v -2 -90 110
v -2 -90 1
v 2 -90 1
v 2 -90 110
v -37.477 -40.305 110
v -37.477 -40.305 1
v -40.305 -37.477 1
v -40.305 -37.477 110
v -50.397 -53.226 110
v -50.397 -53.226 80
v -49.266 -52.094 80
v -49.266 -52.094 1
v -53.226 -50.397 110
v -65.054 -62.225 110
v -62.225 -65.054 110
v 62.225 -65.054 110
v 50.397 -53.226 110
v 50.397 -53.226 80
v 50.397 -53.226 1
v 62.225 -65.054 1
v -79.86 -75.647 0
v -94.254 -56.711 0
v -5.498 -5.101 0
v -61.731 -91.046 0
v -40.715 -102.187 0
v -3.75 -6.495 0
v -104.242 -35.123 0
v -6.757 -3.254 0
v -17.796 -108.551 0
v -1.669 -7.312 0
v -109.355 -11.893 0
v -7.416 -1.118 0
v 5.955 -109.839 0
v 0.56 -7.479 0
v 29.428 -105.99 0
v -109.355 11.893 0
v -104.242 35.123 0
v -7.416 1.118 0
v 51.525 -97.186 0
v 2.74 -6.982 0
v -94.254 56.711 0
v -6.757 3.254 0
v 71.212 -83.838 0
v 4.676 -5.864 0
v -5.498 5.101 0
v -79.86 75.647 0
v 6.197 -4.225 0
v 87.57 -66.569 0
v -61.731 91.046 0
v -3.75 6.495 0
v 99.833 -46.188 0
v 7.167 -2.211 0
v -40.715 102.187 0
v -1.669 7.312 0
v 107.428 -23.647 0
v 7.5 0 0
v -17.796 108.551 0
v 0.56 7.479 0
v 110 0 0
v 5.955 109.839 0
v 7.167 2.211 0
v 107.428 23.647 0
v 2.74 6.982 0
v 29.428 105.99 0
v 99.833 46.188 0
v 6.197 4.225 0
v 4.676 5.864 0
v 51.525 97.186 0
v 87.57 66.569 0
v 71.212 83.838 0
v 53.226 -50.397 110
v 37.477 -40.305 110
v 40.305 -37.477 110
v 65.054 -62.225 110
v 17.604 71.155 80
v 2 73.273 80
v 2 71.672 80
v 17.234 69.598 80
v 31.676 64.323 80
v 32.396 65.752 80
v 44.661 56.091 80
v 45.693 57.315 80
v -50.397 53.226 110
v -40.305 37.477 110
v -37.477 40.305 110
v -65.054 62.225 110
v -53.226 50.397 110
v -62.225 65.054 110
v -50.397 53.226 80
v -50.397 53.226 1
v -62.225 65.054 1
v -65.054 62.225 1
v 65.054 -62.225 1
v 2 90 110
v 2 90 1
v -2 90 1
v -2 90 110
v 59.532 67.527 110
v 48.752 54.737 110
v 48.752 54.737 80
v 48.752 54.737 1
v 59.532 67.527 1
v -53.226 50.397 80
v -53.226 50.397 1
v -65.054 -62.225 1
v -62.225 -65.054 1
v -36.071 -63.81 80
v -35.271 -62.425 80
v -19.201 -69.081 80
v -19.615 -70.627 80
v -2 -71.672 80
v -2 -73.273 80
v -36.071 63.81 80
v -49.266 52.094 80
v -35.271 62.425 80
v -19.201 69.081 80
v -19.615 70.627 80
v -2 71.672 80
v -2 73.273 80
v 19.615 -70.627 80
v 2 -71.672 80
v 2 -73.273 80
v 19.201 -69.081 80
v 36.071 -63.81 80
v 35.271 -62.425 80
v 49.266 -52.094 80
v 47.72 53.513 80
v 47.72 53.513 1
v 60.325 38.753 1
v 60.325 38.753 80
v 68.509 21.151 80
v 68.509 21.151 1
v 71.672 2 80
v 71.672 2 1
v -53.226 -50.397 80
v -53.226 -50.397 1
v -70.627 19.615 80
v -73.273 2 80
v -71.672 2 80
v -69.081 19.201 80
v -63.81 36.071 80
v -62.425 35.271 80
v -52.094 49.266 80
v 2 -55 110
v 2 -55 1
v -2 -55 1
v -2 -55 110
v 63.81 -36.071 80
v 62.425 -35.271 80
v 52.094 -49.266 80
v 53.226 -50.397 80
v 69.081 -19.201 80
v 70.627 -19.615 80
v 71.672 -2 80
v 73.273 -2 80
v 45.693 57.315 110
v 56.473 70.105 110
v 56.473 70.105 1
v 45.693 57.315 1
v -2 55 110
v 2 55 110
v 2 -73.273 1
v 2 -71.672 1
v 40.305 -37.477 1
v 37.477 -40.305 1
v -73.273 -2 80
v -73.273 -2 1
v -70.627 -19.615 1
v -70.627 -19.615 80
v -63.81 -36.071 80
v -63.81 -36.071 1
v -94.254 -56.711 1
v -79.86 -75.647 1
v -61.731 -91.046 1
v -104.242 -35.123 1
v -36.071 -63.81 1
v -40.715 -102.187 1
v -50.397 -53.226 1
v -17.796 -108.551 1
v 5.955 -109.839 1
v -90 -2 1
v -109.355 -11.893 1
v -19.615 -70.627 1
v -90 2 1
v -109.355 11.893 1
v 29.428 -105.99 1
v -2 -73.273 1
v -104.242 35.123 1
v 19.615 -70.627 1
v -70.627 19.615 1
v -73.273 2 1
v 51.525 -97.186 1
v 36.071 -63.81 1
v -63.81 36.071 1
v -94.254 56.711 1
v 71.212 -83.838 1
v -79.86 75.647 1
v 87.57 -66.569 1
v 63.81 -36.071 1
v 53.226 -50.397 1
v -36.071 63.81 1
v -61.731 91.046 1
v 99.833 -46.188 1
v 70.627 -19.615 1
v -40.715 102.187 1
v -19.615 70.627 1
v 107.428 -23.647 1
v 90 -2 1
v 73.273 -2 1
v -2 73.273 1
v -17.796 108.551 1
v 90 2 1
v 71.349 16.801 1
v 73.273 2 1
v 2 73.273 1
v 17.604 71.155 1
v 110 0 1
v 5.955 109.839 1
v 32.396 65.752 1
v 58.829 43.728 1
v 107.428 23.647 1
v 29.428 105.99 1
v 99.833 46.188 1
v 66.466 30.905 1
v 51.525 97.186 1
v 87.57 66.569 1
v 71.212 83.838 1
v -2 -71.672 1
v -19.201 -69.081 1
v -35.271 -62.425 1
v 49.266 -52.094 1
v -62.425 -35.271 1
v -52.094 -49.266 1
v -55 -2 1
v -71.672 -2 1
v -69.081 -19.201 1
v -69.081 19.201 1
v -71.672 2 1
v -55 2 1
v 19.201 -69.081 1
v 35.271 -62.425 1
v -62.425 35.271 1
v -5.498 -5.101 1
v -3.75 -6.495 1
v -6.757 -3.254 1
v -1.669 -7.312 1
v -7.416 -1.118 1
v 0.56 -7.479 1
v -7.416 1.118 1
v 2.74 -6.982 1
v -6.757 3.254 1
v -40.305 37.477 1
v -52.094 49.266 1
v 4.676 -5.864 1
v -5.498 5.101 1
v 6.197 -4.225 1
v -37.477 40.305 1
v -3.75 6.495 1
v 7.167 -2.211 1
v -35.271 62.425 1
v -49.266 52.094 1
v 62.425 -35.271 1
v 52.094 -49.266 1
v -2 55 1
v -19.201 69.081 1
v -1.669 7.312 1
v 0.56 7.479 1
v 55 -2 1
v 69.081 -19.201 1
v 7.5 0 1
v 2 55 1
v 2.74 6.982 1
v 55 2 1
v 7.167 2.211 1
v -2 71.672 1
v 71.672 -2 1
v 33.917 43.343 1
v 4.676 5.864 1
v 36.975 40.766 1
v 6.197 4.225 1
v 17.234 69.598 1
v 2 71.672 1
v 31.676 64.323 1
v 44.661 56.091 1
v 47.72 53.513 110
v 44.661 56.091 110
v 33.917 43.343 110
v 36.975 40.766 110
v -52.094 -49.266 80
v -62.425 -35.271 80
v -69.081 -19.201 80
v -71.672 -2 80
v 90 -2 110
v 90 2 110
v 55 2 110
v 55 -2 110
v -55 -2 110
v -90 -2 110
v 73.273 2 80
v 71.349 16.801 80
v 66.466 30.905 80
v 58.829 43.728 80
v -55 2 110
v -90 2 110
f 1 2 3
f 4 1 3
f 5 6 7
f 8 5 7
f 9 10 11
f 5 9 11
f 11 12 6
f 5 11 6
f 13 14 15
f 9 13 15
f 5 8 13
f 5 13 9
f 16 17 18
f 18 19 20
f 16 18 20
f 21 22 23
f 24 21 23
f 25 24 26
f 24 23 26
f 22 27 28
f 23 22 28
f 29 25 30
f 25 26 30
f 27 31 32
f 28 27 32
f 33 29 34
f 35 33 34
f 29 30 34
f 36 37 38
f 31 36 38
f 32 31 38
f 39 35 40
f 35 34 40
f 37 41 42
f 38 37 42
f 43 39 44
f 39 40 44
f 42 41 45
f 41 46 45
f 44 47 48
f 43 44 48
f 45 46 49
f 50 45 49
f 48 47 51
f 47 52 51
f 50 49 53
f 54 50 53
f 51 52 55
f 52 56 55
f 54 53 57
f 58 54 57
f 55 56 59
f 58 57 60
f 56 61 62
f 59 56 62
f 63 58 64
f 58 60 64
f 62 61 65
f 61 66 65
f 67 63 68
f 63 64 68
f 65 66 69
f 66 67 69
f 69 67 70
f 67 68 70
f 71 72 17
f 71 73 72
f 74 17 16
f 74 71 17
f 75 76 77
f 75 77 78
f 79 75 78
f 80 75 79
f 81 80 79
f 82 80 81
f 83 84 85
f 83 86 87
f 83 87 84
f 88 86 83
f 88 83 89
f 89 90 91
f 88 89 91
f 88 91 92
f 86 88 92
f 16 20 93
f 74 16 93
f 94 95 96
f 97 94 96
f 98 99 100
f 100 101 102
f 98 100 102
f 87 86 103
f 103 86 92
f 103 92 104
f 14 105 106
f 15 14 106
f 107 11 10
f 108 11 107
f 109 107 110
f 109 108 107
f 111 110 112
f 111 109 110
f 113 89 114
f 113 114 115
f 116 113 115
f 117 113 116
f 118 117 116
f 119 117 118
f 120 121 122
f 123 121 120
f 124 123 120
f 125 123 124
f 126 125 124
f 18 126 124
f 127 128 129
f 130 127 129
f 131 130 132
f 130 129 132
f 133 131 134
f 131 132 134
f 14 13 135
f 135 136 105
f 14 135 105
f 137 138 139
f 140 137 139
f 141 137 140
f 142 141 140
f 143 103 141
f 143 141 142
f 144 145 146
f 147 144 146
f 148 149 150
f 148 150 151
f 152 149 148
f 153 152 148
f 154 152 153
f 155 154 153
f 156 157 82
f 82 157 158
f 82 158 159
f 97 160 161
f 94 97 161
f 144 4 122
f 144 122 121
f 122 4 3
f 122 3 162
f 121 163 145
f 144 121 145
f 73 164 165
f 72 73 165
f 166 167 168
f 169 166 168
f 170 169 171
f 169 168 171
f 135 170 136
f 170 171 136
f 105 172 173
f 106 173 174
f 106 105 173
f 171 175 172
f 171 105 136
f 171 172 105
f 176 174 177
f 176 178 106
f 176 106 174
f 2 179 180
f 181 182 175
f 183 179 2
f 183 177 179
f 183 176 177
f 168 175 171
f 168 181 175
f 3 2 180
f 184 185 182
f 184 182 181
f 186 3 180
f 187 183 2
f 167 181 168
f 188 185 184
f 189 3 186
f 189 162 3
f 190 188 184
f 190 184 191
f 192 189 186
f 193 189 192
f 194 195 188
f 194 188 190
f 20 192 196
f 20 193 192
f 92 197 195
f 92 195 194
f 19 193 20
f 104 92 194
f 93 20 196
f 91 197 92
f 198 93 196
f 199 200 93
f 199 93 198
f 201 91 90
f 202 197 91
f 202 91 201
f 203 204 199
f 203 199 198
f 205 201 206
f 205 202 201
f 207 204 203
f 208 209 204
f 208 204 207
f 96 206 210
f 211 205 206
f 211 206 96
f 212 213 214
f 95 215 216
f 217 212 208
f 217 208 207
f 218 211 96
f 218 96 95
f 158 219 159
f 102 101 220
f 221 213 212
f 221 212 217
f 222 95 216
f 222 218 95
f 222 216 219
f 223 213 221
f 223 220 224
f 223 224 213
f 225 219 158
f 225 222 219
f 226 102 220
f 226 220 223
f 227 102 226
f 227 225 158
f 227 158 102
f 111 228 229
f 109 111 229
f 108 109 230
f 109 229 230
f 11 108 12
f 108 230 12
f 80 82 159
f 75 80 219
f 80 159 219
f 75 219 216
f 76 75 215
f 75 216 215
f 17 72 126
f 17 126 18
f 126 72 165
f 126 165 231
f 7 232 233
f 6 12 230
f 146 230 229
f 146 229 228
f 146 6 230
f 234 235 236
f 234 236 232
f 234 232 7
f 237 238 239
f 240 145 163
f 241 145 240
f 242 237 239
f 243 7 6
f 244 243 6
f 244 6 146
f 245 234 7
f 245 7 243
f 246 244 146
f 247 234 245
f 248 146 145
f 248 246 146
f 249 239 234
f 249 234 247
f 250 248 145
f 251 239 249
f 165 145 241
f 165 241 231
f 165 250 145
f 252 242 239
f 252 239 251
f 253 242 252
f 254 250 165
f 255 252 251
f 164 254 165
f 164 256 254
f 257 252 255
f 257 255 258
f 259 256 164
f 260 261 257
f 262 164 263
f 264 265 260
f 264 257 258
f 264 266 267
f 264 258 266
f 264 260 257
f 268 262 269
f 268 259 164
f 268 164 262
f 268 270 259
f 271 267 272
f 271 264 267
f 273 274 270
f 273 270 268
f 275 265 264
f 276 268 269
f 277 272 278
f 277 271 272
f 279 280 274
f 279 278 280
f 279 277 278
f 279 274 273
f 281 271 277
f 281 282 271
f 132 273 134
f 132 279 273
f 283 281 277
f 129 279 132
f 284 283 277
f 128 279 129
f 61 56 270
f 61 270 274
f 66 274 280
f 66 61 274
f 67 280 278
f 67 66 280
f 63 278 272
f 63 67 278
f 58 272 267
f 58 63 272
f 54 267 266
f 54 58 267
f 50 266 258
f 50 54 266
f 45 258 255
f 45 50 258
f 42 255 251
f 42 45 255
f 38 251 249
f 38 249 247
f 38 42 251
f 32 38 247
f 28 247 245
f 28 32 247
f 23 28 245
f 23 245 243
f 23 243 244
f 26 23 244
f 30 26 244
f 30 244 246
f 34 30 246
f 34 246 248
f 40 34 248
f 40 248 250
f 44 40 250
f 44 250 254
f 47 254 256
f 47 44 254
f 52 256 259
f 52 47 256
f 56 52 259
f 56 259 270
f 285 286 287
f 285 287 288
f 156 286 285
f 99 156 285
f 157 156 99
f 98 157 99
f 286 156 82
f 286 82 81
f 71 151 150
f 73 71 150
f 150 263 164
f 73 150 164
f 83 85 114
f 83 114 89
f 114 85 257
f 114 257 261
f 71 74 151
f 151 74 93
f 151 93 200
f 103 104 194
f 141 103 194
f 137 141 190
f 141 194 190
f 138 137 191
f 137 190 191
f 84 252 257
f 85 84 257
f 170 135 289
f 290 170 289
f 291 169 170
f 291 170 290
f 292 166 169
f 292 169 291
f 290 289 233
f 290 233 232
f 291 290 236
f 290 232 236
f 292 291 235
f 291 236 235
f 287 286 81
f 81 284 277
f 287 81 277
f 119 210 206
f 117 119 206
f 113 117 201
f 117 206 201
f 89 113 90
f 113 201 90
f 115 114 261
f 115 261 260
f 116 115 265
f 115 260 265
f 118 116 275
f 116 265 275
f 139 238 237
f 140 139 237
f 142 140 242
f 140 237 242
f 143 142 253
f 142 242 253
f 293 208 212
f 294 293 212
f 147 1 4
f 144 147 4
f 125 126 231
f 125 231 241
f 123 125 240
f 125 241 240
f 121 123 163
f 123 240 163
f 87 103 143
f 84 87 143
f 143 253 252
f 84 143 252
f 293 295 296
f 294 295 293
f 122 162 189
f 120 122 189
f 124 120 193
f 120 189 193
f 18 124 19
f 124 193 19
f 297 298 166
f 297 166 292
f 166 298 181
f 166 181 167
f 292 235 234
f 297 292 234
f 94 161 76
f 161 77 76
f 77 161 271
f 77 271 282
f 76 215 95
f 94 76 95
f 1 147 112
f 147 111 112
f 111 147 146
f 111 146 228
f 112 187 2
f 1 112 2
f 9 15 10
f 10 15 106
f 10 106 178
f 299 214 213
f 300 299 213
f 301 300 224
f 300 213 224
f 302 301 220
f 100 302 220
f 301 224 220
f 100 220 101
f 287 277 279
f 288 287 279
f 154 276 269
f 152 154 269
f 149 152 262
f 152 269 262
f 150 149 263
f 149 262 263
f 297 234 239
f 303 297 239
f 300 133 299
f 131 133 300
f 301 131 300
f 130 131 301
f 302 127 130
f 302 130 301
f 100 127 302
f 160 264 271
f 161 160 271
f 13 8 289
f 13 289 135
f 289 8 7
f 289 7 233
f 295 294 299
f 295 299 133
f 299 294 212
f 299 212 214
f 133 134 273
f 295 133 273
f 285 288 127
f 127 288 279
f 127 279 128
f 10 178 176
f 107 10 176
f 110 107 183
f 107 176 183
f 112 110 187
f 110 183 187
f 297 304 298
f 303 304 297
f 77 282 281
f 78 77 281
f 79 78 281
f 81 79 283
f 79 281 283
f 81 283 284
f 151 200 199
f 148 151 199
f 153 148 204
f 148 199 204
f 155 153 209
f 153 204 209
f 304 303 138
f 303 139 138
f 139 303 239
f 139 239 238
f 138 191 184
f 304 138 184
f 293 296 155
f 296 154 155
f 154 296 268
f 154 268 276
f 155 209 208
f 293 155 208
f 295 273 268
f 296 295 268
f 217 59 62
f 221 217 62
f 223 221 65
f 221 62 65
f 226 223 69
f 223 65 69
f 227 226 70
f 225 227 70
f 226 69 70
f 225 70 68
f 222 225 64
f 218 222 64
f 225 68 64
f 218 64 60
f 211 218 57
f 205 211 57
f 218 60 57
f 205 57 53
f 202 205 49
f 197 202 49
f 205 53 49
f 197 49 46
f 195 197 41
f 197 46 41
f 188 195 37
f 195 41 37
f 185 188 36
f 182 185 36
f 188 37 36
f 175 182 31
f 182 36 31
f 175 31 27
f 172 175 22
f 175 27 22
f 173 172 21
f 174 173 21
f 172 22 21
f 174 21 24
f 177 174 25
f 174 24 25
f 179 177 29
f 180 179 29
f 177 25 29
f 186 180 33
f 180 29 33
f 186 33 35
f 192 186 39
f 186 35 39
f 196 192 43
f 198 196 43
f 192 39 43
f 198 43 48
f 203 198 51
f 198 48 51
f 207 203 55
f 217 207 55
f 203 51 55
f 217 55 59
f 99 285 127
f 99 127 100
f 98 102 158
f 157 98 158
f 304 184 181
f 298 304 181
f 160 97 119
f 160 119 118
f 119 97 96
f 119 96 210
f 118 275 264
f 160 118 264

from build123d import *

# Parameters (mm, degrees)
F0_R     = 110
F1_DEPTH = 1
F0_R_2   = 7.5
F2_DEPTH = 110
F3_DEPTH = 80


with BuildPart() as f1:
    # F0 (on Top) → F1 (new body)
    with BuildSketch(Plane.XY):
        Circle(F0_R)
        with BuildLine():
            Line((-90, 2), (-73.2727097902, 2))
            ThreePointArc((-73.2727097902, 2), (-67.7203697331, 28.0506955924), (-53.2258435309, 50.3974164062))
            Line((-53.2258435309, 50.3974164062), (-65.0538238692, 62.2253967444))
            Line((-65.0538238692, 62.2253967444), (-62.2253967444, 65.0538238692))
            Line((-62.2253967444, 65.0538238692), (-50.3974164062, 53.2258435309))
            ThreePointArc((-50.3974164062, 53.2258435309), (-28.0506955924, 67.7203697331), (-2, 73.2727097902))
            Line((-2, 73.2727097902), (-2, 90))
            Line((-2, 90), (2, 90))
            Line((2, 90), (2, 73.2727097902))
            ThreePointArc((2, 73.2727097902), (25.1459027822, 68.8518233111), (45.6930285955, 57.3152435027))
            Line((45.6930285955, 57.3152435027), (56.4733154171, 70.105382431))
            Line((56.4733154171, 70.105382431), (59.5318237034, 67.5274904506))
            Line((59.5318237034, 67.5274904506), (48.7515368817, 54.7373515223))
            ThreePointArc((48.7515368817, 54.7373515223), (66.4664295367, 30.904752784), (73.2727097902, 2))
            Line((73.2727097902, 2), (90, 2))
            Line((90, 2), (90, -2))
            Line((90, -2), (73.2727097902, -2))
            ThreePointArc((73.2727097902, -2), (67.7203697331, -28.0506955924), (53.2258435309, -50.3974164062))
            Line((53.2258435309, -50.3974164062), (65.0538238692, -62.2253967444))
            Line((65.0538238692, -62.2253967444), (62.2253967444, -65.0538238692))
            Line((62.2253967444, -65.0538238692), (50.3974164062, -53.2258435309))
            ThreePointArc((50.3974164062, -53.2258435309), (28.0506955924, -67.7203697331), (2, -73.2727097902))
            Line((2, -73.2727097902), (2, -90))
            Line((2, -90), (-2, -90))
            Line((-2, -90), (-2, -73.2727097902))
            ThreePointArc((-2, -73.2727097902), (-28.0506955924, -67.7203697331), (-50.3974164062, -53.2258435309))
            Line((-50.3974164062, -53.2258435309), (-62.2253967444, -65.0538238692))
            Line((-62.2253967444, -65.0538238692), (-65.0538238692, -62.2253967444))
            Line((-65.0538238692, -62.2253967444), (-53.2258435309, -50.3974164062))
            ThreePointArc((-53.2258435309, -50.3974164062), (-67.7203697331, -28.0506955924), (-73.2727097902, -2))
            Line((-73.2727097902, -2), (-90, -2))
            Line((-90, -2), (-90, 2))
        make_face(mode=Mode.SUBTRACT)
    extrude(amount=F1_DEPTH)



with BuildPart() as f1b:
    # F0 (on Top) → F1, piece 2 (new body)
    with BuildSketch(Plane.XY):
        with BuildLine():
            Line((-71.6721005692, 2), (-55, 2))
            Line((-55, 2), (-55, -2))
            Line((-55, -2), (-71.6721005692, -2))
            ThreePointArc((-71.6721005692, -2), (-66.2421624811, -27.4384021006), (-52.0940418967, -49.265614772))
            Line((-52.0940418967, -49.265614772), (-40.3050865276, -37.4766594029))
            Line((-40.3050865276, -37.4766594029), (-37.4766594029, -40.3050865276))
            Line((-37.4766594029, -40.3050865276), (-49.265614772, -52.0940418967))
            ThreePointArc((-49.265614772, -52.0940418967), (-27.4384021006, -66.2421624811), (-2, -71.6721005692))
            Line((-2, -71.6721005692), (-2, -55))
            Line((-2, -55), (2, -55))
            Line((2, -55), (2, -71.6721005692))
            ThreePointArc((2, -71.6721005692), (27.4384021006, -66.2421624811), (49.265614772, -52.0940418967))
            Line((49.265614772, -52.0940418967), (37.4766594029, -40.3050865276))
            Line((37.4766594029, -40.3050865276), (40.3050865276, -37.4766594029))
            Line((40.3050865276, -37.4766594029), (52.0940418967, -49.265614772))
            ThreePointArc((52.0940418967, -49.265614772), (66.2421624811, -27.4384021006), (71.6721005692, -2))
            Line((71.6721005692, -2), (55, -2))
            Line((55, -2), (55, 2))
            Line((55, 2), (71.6721005692, 2))
            ThreePointArc((71.6721005692, 2), (65.0155934213, 30.2301606359), (47.719987463, 53.5134823809))
            Line((47.719987463, 53.5134823809), (36.9752688744, 40.7655429458))
            Line((36.9752688744, 40.7655429458), (33.9167605881, 43.3434349263))
            Line((33.9167605881, 43.3434349263), (44.6614791768, 56.0913743613))
            ThreePointArc((44.6614791768, 56.0913743613), (24.597015409, 67.3489185731), (2, 71.6721005692))
            Line((2, 71.6721005692), (2, 55))
            Line((2, 55), (-2, 55))
            Line((-2, 55), (-2, 71.6721005692))
            ThreePointArc((-2, 71.6721005692), (-27.4384021006, 66.2421624811), (-49.265614772, 52.0940418967))
            Line((-49.265614772, 52.0940418967), (-37.4766594029, 40.3050865276))
            Line((-37.4766594029, 40.3050865276), (-40.3050865276, 37.4766594029))
            Line((-40.3050865276, 37.4766594029), (-52.0940418967, 49.265614772))
            ThreePointArc((-52.0940418967, 49.265614772), (-66.2421624811, 27.4384021006), (-71.6721005692, 2))
        make_face()
        Circle(F0_R_2, mode=Mode.SUBTRACT)
    extrude(amount=F1_DEPTH)


with BuildPart() as f1_1:
    add(f1.part)

    add(f1b.part)  # F2 merges F1b
    # F0 (on Top) → F2 (join)
    with BuildSketch(Plane.XY):
        with BuildLine():
            Line((-55, -2), (-55, 2))
            Line((-55, 2), (-71.6721005692, 2))
            ThreePointArc((-71.6721005692, 2), (-71.7, 0), (-71.6721005692, -2))
            Line((-71.6721005692, -2), (-55, -2))
        make_face()
        with BuildLine():
            ThreePointArc((-71.6721005692, -2), (-71.7, 0), (-71.6721005692, 2))
            Line((-71.6721005692, 2), (-73.2727097902, 2))
            ThreePointArc((-73.2727097902, 2), (-73.3, 0), (-73.2727097902, -2))
            Line((-73.2727097902, -2), (-71.6721005692, -2))
        make_face()
        with BuildLine():
            ThreePointArc((-73.2727097902, -2), (-73.3, 0), (-73.2727097902, 2))
            Line((-73.2727097902, 2), (-90, 2))
            Line((-90, 2), (-90, -2))
            Line((-90, -2), (-73.2727097902, -2))
        make_face()
        with BuildLine():
            ThreePointArc((-49.265614772, 52.0940418967), (-50.6995562111, 50.6995562111), (-52.0940418967, 49.265614772))
            Line((-52.0940418967, 49.265614772), (-40.3050865276, 37.4766594029))
            Line((-40.3050865276, 37.4766594029), (-37.4766594029, 40.3050865276))
            Line((-37.4766594029, 40.3050865276), (-49.265614772, 52.0940418967))
        make_face()
        with BuildLine():
            Line((-53.2258435309, 50.3974164062), (-52.0940418967, 49.265614772))
            ThreePointArc((-52.0940418967, 49.265614772), (-50.6995562111, 50.6995562111), (-49.265614772, 52.0940418967))
            Line((-49.265614772, 52.0940418967), (-50.3974164062, 53.2258435309))
            ThreePointArc((-50.3974164062, 53.2258435309), (-51.830927061, 51.830927061), (-53.2258435309, 50.3974164062))
        make_face()
        with BuildLine():
            Line((-65.0538238692, 62.2253967444), (-53.2258435309, 50.3974164062))
            ThreePointArc((-53.2258435309, 50.3974164062), (-51.830927061, 51.830927061), (-50.3974164062, 53.2258435309))
            Line((-50.3974164062, 53.2258435309), (-62.2253967444, 65.0538238692))
            Line((-62.2253967444, 65.0538238692), (-65.0538238692, 62.2253967444))
        make_face()
        with BuildLine():
            ThreePointArc((2, 71.6721005692), (0, 71.7), (-2, 71.6721005692))
            Line((-2, 71.6721005692), (-2, 55))
            Line((-2, 55), (2, 55))
            Line((2, 55), (2, 71.6721005692))
        make_face()
        with BuildLine():
            Line((-2, 73.2727097902), (-2, 71.6721005692))
            ThreePointArc((-2, 71.6721005692), (0, 71.7), (2, 71.6721005692))
            Line((2, 71.6721005692), (2, 73.2727097902))
            ThreePointArc((2, 73.2727097902), (0, 73.3), (-2, 73.2727097902))
        make_face()
        with BuildLine():
            Line((-2, 90), (-2, 73.2727097902))
            ThreePointArc((-2, 73.2727097902), (0, 73.3), (2, 73.2727097902))
            Line((2, 73.2727097902), (2, 90))
            Line((2, 90), (-2, 90))
        make_face()
        with BuildLine():
            ThreePointArc((47.719987463, 53.5134823809), (46.2087137496, 54.8237610312), (44.6614791768, 56.0913743613))
            Line((44.6614791768, 56.0913743613), (33.9167605881, 43.3434349263))
            Line((33.9167605881, 43.3434349263), (36.9752688744, 40.7655429458))
            Line((36.9752688744, 40.7655429458), (47.719987463, 53.5134823809))
        make_face()
        with BuildLine():
            Line((45.6930285955, 57.3152435027), (44.6614791768, 56.0913743613))
            ThreePointArc((44.6614791768, 56.0913743613), (46.2087137496, 54.8237610312), (47.719987463, 53.5134823809))
            Line((47.719987463, 53.5134823809), (48.7515368817, 54.7373515223))
            ThreePointArc((48.7515368817, 54.7373515223), (47.2398705418, 56.0471643457), (45.6930285955, 57.3152435027))
        make_face()
        with BuildLine():
            Line((56.4733154171, 70.105382431), (45.6930285955, 57.3152435027))
            ThreePointArc((45.6930285955, 57.3152435027), (47.2398705418, 56.0471643457), (48.7515368817, 54.7373515223))
            Line((48.7515368817, 54.7373515223), (59.5318237034, 67.5274904506))
            Line((59.5318237034, 67.5274904506), (56.4733154171, 70.105382431))
        make_face()
        with BuildLine():
            ThreePointArc((71.7, 0), (71.693024803, 1.0000972925), (71.6721005692, 2))
            Line((71.6721005692, 2), (55, 2))
            Line((55, 2), (55, -2))
            Line((55, -2), (71.6721005692, -2))
            ThreePointArc((71.6721005692, -2), (71.693024803, -1.0000972925), (71.7, 0))
        make_face()
        with BuildLine():
            Line((73.2727097902, 2), (71.6721005692, 2))
            ThreePointArc((71.6721005692, 2), (71.693024803, 1.0000972925), (71.7, 0))
            ThreePointArc((71.7, 0), (71.693024803, -1.0000972925), (71.6721005692, -2))
            Line((71.6721005692, -2), (73.2727097902, -2))
            ThreePointArc((73.2727097902, -2), (73.29317713, -1.0000930901), (73.3, 0))
            ThreePointArc((73.3, 0), (73.29317713, 1.0000930901), (73.2727097902, 2))
        make_face()
        with BuildLine():
            Line((90, 2), (73.2727097902, 2))
            ThreePointArc((73.2727097902, 2), (73.29317713, 1.0000930901), (73.3, 0))
            ThreePointArc((73.3, 0), (73.29317713, -1.0000930901), (73.2727097902, -2))
            Line((73.2727097902, -2), (90, -2))
            Line((90, -2), (90, 2))
        make_face()
        with BuildLine():
            Line((37.4766594029, -40.3050865276), (49.265614772, -52.0940418967))
            ThreePointArc((49.265614772, -52.0940418967), (50.6995562111, -50.6995562111), (52.0940418967, -49.265614772))
            Line((52.0940418967, -49.265614772), (40.3050865276, -37.4766594029))
            Line((40.3050865276, -37.4766594029), (37.4766594029, -40.3050865276))
        make_face()
        with BuildLine():
            ThreePointArc((52.0940418967, -49.265614772), (50.6995562111, -50.6995562111), (49.265614772, -52.0940418967))
            Line((49.265614772, -52.0940418967), (50.3974164062, -53.2258435309))
            ThreePointArc((50.3974164062, -53.2258435309), (51.830927061, -51.830927061), (53.2258435309, -50.3974164062))
            Line((53.2258435309, -50.3974164062), (52.0940418967, -49.265614772))
        make_face()
        with BuildLine():
            ThreePointArc((53.2258435309, -50.3974164062), (51.830927061, -51.830927061), (50.3974164062, -53.2258435309))
            Line((50.3974164062, -53.2258435309), (62.2253967444, -65.0538238692))
            Line((62.2253967444, -65.0538238692), (65.0538238692, -62.2253967444))
            Line((65.0538238692, -62.2253967444), (53.2258435309, -50.3974164062))
        make_face()
        with BuildLine():
            Line((-2, -55), (-2, -71.6721005692))
            ThreePointArc((-2, -71.6721005692), (0, -71.7), (2, -71.6721005692))
            Line((2, -71.6721005692), (2, -55))
            Line((2, -55), (-2, -55))
        make_face()
        with BuildLine():
            ThreePointArc((2, -71.6721005692), (0, -71.7), (-2, -71.6721005692))
            Line((-2, -71.6721005692), (-2, -73.2727097902))
            ThreePointArc((-2, -73.2727097902), (0, -73.3), (2, -73.2727097902))
            Line((2, -73.2727097902), (2, -71.6721005692))
        make_face()
        with BuildLine():
            ThreePointArc((2, -73.2727097902), (0, -73.3), (-2, -73.2727097902))
            Line((-2, -73.2727097902), (-2, -90))
            Line((-2, -90), (2, -90))
            Line((2, -90), (2, -73.2727097902))
        make_face()
        with BuildLine():
            Line((-40.3050865276, -37.4766594029), (-52.0940418967, -49.265614772))
            ThreePointArc((-52.0940418967, -49.265614772), (-50.6995562111, -50.6995562111), (-49.265614772, -52.0940418967))
            Line((-49.265614772, -52.0940418967), (-37.4766594029, -40.3050865276))
            Line((-37.4766594029, -40.3050865276), (-40.3050865276, -37.4766594029))
        make_face()
        with BuildLine():
            ThreePointArc((-49.265614772, -52.0940418967), (-50.6995562111, -50.6995562111), (-52.0940418967, -49.265614772))
            Line((-52.0940418967, -49.265614772), (-53.2258435309, -50.3974164062))
            ThreePointArc((-53.2258435309, -50.3974164062), (-51.830927061, -51.830927061), (-50.3974164062, -53.2258435309))
            Line((-50.3974164062, -53.2258435309), (-49.265614772, -52.0940418967))
        make_face()
        with BuildLine():
            ThreePointArc((-50.3974164062, -53.2258435309), (-51.830927061, -51.830927061), (-53.2258435309, -50.3974164062))
            Line((-53.2258435309, -50.3974164062), (-65.0538238692, -62.2253967444))
            Line((-65.0538238692, -62.2253967444), (-62.2253967444, -65.0538238692))
            Line((-62.2253967444, -65.0538238692), (-50.3974164062, -53.2258435309))
        make_face()
    extrude(amount=F2_DEPTH)

    # F0 (on Top) → F3 (join)
    with BuildSketch(Plane.XY):
        with BuildLine():
            Line((-73.2727097902, 2), (-71.6721005692, 2))
            ThreePointArc((-71.6721005692, 2), (-66.2421624811, 27.4384021006), (-52.0940418967, 49.265614772))
            Line((-52.0940418967, 49.265614772), (-53.2258435309, 50.3974164062))
            ThreePointArc((-53.2258435309, 50.3974164062), (-67.7203697331, 28.0506955924), (-73.2727097902, 2))
        make_face()
        with BuildLine():
            Line((-50.3974164062, 53.2258435309), (-49.265614772, 52.0940418967))
            ThreePointArc((-49.265614772, 52.0940418967), (-27.4384021006, 66.2421624811), (-2, 71.6721005692))
            Line((-2, 71.6721005692), (-2, 73.2727097902))
            ThreePointArc((-2, 73.2727097902), (-28.0506955924, 67.7203697331), (-50.3974164062, 53.2258435309))
        make_face()
        with BuildLine():
            Line((2, 73.2727097902), (2, 71.6721005692))
            ThreePointArc((2, 71.6721005692), (24.597015409, 67.3489185731), (44.6614791768, 56.0913743613))
            Line((44.6614791768, 56.0913743613), (45.6930285955, 57.3152435027))
            ThreePointArc((45.6930285955, 57.3152435027), (25.1459027822, 68.8518233111), (2, 73.2727097902))
        make_face()
        with BuildLine():
            Line((48.7515368817, 54.7373515223), (47.719987463, 53.5134823809))
            ThreePointArc((47.719987463, 53.5134823809), (65.0155934213, 30.2301606359), (71.6721005692, 2))
            Line((71.6721005692, 2), (73.2727097902, 2))
            ThreePointArc((73.2727097902, 2), (66.4664295367, 30.904752784), (48.7515368817, 54.7373515223))
        make_face()
        with BuildLine():
            ThreePointArc((71.6721005692, -2), (66.2421624811, -27.4384021006), (52.0940418967, -49.265614772))
            Line((52.0940418967, -49.265614772), (53.2258435309, -50.3974164062))
            ThreePointArc((53.2258435309, -50.3974164062), (67.7203697331, -28.0506955924), (73.2727097902, -2))
            Line((73.2727097902, -2), (71.6721005692, -2))
        make_face()
        with BuildLine():
            ThreePointArc((49.265614772, -52.0940418967), (27.4384021006, -66.2421624811), (2, -71.6721005692))
            Line((2, -71.6721005692), (2, -73.2727097902))
            ThreePointArc((2, -73.2727097902), (28.0506955924, -67.7203697331), (50.3974164062, -53.2258435309))
            Line((50.3974164062, -53.2258435309), (49.265614772, -52.0940418967))
        make_face()
        with BuildLine():
            ThreePointArc((-2, -71.6721005692), (-27.4384021006, -66.2421624811), (-49.265614772, -52.0940418967))
            Line((-49.265614772, -52.0940418967), (-50.3974164062, -53.2258435309))
            ThreePointArc((-50.3974164062, -53.2258435309), (-28.0506955924, -67.7203697331), (-2, -73.2727097902))
            Line((-2, -73.2727097902), (-2, -71.6721005692))
        make_face()
        with BuildLine():
            ThreePointArc((-52.0940418967, -49.265614772), (-66.2421624811, -27.4384021006), (-71.6721005692, -2))
            Line((-71.6721005692, -2), (-73.2727097902, -2))
            ThreePointArc((-73.2727097902, -2), (-67.7203697331, -28.0506955924), (-53.2258435309, -50.3974164062))
            Line((-53.2258435309, -50.3974164062), (-52.0940418967, -49.265614772))
        make_face()
    extrude(amount=F3_DEPTH)


solid = f1_1.part
